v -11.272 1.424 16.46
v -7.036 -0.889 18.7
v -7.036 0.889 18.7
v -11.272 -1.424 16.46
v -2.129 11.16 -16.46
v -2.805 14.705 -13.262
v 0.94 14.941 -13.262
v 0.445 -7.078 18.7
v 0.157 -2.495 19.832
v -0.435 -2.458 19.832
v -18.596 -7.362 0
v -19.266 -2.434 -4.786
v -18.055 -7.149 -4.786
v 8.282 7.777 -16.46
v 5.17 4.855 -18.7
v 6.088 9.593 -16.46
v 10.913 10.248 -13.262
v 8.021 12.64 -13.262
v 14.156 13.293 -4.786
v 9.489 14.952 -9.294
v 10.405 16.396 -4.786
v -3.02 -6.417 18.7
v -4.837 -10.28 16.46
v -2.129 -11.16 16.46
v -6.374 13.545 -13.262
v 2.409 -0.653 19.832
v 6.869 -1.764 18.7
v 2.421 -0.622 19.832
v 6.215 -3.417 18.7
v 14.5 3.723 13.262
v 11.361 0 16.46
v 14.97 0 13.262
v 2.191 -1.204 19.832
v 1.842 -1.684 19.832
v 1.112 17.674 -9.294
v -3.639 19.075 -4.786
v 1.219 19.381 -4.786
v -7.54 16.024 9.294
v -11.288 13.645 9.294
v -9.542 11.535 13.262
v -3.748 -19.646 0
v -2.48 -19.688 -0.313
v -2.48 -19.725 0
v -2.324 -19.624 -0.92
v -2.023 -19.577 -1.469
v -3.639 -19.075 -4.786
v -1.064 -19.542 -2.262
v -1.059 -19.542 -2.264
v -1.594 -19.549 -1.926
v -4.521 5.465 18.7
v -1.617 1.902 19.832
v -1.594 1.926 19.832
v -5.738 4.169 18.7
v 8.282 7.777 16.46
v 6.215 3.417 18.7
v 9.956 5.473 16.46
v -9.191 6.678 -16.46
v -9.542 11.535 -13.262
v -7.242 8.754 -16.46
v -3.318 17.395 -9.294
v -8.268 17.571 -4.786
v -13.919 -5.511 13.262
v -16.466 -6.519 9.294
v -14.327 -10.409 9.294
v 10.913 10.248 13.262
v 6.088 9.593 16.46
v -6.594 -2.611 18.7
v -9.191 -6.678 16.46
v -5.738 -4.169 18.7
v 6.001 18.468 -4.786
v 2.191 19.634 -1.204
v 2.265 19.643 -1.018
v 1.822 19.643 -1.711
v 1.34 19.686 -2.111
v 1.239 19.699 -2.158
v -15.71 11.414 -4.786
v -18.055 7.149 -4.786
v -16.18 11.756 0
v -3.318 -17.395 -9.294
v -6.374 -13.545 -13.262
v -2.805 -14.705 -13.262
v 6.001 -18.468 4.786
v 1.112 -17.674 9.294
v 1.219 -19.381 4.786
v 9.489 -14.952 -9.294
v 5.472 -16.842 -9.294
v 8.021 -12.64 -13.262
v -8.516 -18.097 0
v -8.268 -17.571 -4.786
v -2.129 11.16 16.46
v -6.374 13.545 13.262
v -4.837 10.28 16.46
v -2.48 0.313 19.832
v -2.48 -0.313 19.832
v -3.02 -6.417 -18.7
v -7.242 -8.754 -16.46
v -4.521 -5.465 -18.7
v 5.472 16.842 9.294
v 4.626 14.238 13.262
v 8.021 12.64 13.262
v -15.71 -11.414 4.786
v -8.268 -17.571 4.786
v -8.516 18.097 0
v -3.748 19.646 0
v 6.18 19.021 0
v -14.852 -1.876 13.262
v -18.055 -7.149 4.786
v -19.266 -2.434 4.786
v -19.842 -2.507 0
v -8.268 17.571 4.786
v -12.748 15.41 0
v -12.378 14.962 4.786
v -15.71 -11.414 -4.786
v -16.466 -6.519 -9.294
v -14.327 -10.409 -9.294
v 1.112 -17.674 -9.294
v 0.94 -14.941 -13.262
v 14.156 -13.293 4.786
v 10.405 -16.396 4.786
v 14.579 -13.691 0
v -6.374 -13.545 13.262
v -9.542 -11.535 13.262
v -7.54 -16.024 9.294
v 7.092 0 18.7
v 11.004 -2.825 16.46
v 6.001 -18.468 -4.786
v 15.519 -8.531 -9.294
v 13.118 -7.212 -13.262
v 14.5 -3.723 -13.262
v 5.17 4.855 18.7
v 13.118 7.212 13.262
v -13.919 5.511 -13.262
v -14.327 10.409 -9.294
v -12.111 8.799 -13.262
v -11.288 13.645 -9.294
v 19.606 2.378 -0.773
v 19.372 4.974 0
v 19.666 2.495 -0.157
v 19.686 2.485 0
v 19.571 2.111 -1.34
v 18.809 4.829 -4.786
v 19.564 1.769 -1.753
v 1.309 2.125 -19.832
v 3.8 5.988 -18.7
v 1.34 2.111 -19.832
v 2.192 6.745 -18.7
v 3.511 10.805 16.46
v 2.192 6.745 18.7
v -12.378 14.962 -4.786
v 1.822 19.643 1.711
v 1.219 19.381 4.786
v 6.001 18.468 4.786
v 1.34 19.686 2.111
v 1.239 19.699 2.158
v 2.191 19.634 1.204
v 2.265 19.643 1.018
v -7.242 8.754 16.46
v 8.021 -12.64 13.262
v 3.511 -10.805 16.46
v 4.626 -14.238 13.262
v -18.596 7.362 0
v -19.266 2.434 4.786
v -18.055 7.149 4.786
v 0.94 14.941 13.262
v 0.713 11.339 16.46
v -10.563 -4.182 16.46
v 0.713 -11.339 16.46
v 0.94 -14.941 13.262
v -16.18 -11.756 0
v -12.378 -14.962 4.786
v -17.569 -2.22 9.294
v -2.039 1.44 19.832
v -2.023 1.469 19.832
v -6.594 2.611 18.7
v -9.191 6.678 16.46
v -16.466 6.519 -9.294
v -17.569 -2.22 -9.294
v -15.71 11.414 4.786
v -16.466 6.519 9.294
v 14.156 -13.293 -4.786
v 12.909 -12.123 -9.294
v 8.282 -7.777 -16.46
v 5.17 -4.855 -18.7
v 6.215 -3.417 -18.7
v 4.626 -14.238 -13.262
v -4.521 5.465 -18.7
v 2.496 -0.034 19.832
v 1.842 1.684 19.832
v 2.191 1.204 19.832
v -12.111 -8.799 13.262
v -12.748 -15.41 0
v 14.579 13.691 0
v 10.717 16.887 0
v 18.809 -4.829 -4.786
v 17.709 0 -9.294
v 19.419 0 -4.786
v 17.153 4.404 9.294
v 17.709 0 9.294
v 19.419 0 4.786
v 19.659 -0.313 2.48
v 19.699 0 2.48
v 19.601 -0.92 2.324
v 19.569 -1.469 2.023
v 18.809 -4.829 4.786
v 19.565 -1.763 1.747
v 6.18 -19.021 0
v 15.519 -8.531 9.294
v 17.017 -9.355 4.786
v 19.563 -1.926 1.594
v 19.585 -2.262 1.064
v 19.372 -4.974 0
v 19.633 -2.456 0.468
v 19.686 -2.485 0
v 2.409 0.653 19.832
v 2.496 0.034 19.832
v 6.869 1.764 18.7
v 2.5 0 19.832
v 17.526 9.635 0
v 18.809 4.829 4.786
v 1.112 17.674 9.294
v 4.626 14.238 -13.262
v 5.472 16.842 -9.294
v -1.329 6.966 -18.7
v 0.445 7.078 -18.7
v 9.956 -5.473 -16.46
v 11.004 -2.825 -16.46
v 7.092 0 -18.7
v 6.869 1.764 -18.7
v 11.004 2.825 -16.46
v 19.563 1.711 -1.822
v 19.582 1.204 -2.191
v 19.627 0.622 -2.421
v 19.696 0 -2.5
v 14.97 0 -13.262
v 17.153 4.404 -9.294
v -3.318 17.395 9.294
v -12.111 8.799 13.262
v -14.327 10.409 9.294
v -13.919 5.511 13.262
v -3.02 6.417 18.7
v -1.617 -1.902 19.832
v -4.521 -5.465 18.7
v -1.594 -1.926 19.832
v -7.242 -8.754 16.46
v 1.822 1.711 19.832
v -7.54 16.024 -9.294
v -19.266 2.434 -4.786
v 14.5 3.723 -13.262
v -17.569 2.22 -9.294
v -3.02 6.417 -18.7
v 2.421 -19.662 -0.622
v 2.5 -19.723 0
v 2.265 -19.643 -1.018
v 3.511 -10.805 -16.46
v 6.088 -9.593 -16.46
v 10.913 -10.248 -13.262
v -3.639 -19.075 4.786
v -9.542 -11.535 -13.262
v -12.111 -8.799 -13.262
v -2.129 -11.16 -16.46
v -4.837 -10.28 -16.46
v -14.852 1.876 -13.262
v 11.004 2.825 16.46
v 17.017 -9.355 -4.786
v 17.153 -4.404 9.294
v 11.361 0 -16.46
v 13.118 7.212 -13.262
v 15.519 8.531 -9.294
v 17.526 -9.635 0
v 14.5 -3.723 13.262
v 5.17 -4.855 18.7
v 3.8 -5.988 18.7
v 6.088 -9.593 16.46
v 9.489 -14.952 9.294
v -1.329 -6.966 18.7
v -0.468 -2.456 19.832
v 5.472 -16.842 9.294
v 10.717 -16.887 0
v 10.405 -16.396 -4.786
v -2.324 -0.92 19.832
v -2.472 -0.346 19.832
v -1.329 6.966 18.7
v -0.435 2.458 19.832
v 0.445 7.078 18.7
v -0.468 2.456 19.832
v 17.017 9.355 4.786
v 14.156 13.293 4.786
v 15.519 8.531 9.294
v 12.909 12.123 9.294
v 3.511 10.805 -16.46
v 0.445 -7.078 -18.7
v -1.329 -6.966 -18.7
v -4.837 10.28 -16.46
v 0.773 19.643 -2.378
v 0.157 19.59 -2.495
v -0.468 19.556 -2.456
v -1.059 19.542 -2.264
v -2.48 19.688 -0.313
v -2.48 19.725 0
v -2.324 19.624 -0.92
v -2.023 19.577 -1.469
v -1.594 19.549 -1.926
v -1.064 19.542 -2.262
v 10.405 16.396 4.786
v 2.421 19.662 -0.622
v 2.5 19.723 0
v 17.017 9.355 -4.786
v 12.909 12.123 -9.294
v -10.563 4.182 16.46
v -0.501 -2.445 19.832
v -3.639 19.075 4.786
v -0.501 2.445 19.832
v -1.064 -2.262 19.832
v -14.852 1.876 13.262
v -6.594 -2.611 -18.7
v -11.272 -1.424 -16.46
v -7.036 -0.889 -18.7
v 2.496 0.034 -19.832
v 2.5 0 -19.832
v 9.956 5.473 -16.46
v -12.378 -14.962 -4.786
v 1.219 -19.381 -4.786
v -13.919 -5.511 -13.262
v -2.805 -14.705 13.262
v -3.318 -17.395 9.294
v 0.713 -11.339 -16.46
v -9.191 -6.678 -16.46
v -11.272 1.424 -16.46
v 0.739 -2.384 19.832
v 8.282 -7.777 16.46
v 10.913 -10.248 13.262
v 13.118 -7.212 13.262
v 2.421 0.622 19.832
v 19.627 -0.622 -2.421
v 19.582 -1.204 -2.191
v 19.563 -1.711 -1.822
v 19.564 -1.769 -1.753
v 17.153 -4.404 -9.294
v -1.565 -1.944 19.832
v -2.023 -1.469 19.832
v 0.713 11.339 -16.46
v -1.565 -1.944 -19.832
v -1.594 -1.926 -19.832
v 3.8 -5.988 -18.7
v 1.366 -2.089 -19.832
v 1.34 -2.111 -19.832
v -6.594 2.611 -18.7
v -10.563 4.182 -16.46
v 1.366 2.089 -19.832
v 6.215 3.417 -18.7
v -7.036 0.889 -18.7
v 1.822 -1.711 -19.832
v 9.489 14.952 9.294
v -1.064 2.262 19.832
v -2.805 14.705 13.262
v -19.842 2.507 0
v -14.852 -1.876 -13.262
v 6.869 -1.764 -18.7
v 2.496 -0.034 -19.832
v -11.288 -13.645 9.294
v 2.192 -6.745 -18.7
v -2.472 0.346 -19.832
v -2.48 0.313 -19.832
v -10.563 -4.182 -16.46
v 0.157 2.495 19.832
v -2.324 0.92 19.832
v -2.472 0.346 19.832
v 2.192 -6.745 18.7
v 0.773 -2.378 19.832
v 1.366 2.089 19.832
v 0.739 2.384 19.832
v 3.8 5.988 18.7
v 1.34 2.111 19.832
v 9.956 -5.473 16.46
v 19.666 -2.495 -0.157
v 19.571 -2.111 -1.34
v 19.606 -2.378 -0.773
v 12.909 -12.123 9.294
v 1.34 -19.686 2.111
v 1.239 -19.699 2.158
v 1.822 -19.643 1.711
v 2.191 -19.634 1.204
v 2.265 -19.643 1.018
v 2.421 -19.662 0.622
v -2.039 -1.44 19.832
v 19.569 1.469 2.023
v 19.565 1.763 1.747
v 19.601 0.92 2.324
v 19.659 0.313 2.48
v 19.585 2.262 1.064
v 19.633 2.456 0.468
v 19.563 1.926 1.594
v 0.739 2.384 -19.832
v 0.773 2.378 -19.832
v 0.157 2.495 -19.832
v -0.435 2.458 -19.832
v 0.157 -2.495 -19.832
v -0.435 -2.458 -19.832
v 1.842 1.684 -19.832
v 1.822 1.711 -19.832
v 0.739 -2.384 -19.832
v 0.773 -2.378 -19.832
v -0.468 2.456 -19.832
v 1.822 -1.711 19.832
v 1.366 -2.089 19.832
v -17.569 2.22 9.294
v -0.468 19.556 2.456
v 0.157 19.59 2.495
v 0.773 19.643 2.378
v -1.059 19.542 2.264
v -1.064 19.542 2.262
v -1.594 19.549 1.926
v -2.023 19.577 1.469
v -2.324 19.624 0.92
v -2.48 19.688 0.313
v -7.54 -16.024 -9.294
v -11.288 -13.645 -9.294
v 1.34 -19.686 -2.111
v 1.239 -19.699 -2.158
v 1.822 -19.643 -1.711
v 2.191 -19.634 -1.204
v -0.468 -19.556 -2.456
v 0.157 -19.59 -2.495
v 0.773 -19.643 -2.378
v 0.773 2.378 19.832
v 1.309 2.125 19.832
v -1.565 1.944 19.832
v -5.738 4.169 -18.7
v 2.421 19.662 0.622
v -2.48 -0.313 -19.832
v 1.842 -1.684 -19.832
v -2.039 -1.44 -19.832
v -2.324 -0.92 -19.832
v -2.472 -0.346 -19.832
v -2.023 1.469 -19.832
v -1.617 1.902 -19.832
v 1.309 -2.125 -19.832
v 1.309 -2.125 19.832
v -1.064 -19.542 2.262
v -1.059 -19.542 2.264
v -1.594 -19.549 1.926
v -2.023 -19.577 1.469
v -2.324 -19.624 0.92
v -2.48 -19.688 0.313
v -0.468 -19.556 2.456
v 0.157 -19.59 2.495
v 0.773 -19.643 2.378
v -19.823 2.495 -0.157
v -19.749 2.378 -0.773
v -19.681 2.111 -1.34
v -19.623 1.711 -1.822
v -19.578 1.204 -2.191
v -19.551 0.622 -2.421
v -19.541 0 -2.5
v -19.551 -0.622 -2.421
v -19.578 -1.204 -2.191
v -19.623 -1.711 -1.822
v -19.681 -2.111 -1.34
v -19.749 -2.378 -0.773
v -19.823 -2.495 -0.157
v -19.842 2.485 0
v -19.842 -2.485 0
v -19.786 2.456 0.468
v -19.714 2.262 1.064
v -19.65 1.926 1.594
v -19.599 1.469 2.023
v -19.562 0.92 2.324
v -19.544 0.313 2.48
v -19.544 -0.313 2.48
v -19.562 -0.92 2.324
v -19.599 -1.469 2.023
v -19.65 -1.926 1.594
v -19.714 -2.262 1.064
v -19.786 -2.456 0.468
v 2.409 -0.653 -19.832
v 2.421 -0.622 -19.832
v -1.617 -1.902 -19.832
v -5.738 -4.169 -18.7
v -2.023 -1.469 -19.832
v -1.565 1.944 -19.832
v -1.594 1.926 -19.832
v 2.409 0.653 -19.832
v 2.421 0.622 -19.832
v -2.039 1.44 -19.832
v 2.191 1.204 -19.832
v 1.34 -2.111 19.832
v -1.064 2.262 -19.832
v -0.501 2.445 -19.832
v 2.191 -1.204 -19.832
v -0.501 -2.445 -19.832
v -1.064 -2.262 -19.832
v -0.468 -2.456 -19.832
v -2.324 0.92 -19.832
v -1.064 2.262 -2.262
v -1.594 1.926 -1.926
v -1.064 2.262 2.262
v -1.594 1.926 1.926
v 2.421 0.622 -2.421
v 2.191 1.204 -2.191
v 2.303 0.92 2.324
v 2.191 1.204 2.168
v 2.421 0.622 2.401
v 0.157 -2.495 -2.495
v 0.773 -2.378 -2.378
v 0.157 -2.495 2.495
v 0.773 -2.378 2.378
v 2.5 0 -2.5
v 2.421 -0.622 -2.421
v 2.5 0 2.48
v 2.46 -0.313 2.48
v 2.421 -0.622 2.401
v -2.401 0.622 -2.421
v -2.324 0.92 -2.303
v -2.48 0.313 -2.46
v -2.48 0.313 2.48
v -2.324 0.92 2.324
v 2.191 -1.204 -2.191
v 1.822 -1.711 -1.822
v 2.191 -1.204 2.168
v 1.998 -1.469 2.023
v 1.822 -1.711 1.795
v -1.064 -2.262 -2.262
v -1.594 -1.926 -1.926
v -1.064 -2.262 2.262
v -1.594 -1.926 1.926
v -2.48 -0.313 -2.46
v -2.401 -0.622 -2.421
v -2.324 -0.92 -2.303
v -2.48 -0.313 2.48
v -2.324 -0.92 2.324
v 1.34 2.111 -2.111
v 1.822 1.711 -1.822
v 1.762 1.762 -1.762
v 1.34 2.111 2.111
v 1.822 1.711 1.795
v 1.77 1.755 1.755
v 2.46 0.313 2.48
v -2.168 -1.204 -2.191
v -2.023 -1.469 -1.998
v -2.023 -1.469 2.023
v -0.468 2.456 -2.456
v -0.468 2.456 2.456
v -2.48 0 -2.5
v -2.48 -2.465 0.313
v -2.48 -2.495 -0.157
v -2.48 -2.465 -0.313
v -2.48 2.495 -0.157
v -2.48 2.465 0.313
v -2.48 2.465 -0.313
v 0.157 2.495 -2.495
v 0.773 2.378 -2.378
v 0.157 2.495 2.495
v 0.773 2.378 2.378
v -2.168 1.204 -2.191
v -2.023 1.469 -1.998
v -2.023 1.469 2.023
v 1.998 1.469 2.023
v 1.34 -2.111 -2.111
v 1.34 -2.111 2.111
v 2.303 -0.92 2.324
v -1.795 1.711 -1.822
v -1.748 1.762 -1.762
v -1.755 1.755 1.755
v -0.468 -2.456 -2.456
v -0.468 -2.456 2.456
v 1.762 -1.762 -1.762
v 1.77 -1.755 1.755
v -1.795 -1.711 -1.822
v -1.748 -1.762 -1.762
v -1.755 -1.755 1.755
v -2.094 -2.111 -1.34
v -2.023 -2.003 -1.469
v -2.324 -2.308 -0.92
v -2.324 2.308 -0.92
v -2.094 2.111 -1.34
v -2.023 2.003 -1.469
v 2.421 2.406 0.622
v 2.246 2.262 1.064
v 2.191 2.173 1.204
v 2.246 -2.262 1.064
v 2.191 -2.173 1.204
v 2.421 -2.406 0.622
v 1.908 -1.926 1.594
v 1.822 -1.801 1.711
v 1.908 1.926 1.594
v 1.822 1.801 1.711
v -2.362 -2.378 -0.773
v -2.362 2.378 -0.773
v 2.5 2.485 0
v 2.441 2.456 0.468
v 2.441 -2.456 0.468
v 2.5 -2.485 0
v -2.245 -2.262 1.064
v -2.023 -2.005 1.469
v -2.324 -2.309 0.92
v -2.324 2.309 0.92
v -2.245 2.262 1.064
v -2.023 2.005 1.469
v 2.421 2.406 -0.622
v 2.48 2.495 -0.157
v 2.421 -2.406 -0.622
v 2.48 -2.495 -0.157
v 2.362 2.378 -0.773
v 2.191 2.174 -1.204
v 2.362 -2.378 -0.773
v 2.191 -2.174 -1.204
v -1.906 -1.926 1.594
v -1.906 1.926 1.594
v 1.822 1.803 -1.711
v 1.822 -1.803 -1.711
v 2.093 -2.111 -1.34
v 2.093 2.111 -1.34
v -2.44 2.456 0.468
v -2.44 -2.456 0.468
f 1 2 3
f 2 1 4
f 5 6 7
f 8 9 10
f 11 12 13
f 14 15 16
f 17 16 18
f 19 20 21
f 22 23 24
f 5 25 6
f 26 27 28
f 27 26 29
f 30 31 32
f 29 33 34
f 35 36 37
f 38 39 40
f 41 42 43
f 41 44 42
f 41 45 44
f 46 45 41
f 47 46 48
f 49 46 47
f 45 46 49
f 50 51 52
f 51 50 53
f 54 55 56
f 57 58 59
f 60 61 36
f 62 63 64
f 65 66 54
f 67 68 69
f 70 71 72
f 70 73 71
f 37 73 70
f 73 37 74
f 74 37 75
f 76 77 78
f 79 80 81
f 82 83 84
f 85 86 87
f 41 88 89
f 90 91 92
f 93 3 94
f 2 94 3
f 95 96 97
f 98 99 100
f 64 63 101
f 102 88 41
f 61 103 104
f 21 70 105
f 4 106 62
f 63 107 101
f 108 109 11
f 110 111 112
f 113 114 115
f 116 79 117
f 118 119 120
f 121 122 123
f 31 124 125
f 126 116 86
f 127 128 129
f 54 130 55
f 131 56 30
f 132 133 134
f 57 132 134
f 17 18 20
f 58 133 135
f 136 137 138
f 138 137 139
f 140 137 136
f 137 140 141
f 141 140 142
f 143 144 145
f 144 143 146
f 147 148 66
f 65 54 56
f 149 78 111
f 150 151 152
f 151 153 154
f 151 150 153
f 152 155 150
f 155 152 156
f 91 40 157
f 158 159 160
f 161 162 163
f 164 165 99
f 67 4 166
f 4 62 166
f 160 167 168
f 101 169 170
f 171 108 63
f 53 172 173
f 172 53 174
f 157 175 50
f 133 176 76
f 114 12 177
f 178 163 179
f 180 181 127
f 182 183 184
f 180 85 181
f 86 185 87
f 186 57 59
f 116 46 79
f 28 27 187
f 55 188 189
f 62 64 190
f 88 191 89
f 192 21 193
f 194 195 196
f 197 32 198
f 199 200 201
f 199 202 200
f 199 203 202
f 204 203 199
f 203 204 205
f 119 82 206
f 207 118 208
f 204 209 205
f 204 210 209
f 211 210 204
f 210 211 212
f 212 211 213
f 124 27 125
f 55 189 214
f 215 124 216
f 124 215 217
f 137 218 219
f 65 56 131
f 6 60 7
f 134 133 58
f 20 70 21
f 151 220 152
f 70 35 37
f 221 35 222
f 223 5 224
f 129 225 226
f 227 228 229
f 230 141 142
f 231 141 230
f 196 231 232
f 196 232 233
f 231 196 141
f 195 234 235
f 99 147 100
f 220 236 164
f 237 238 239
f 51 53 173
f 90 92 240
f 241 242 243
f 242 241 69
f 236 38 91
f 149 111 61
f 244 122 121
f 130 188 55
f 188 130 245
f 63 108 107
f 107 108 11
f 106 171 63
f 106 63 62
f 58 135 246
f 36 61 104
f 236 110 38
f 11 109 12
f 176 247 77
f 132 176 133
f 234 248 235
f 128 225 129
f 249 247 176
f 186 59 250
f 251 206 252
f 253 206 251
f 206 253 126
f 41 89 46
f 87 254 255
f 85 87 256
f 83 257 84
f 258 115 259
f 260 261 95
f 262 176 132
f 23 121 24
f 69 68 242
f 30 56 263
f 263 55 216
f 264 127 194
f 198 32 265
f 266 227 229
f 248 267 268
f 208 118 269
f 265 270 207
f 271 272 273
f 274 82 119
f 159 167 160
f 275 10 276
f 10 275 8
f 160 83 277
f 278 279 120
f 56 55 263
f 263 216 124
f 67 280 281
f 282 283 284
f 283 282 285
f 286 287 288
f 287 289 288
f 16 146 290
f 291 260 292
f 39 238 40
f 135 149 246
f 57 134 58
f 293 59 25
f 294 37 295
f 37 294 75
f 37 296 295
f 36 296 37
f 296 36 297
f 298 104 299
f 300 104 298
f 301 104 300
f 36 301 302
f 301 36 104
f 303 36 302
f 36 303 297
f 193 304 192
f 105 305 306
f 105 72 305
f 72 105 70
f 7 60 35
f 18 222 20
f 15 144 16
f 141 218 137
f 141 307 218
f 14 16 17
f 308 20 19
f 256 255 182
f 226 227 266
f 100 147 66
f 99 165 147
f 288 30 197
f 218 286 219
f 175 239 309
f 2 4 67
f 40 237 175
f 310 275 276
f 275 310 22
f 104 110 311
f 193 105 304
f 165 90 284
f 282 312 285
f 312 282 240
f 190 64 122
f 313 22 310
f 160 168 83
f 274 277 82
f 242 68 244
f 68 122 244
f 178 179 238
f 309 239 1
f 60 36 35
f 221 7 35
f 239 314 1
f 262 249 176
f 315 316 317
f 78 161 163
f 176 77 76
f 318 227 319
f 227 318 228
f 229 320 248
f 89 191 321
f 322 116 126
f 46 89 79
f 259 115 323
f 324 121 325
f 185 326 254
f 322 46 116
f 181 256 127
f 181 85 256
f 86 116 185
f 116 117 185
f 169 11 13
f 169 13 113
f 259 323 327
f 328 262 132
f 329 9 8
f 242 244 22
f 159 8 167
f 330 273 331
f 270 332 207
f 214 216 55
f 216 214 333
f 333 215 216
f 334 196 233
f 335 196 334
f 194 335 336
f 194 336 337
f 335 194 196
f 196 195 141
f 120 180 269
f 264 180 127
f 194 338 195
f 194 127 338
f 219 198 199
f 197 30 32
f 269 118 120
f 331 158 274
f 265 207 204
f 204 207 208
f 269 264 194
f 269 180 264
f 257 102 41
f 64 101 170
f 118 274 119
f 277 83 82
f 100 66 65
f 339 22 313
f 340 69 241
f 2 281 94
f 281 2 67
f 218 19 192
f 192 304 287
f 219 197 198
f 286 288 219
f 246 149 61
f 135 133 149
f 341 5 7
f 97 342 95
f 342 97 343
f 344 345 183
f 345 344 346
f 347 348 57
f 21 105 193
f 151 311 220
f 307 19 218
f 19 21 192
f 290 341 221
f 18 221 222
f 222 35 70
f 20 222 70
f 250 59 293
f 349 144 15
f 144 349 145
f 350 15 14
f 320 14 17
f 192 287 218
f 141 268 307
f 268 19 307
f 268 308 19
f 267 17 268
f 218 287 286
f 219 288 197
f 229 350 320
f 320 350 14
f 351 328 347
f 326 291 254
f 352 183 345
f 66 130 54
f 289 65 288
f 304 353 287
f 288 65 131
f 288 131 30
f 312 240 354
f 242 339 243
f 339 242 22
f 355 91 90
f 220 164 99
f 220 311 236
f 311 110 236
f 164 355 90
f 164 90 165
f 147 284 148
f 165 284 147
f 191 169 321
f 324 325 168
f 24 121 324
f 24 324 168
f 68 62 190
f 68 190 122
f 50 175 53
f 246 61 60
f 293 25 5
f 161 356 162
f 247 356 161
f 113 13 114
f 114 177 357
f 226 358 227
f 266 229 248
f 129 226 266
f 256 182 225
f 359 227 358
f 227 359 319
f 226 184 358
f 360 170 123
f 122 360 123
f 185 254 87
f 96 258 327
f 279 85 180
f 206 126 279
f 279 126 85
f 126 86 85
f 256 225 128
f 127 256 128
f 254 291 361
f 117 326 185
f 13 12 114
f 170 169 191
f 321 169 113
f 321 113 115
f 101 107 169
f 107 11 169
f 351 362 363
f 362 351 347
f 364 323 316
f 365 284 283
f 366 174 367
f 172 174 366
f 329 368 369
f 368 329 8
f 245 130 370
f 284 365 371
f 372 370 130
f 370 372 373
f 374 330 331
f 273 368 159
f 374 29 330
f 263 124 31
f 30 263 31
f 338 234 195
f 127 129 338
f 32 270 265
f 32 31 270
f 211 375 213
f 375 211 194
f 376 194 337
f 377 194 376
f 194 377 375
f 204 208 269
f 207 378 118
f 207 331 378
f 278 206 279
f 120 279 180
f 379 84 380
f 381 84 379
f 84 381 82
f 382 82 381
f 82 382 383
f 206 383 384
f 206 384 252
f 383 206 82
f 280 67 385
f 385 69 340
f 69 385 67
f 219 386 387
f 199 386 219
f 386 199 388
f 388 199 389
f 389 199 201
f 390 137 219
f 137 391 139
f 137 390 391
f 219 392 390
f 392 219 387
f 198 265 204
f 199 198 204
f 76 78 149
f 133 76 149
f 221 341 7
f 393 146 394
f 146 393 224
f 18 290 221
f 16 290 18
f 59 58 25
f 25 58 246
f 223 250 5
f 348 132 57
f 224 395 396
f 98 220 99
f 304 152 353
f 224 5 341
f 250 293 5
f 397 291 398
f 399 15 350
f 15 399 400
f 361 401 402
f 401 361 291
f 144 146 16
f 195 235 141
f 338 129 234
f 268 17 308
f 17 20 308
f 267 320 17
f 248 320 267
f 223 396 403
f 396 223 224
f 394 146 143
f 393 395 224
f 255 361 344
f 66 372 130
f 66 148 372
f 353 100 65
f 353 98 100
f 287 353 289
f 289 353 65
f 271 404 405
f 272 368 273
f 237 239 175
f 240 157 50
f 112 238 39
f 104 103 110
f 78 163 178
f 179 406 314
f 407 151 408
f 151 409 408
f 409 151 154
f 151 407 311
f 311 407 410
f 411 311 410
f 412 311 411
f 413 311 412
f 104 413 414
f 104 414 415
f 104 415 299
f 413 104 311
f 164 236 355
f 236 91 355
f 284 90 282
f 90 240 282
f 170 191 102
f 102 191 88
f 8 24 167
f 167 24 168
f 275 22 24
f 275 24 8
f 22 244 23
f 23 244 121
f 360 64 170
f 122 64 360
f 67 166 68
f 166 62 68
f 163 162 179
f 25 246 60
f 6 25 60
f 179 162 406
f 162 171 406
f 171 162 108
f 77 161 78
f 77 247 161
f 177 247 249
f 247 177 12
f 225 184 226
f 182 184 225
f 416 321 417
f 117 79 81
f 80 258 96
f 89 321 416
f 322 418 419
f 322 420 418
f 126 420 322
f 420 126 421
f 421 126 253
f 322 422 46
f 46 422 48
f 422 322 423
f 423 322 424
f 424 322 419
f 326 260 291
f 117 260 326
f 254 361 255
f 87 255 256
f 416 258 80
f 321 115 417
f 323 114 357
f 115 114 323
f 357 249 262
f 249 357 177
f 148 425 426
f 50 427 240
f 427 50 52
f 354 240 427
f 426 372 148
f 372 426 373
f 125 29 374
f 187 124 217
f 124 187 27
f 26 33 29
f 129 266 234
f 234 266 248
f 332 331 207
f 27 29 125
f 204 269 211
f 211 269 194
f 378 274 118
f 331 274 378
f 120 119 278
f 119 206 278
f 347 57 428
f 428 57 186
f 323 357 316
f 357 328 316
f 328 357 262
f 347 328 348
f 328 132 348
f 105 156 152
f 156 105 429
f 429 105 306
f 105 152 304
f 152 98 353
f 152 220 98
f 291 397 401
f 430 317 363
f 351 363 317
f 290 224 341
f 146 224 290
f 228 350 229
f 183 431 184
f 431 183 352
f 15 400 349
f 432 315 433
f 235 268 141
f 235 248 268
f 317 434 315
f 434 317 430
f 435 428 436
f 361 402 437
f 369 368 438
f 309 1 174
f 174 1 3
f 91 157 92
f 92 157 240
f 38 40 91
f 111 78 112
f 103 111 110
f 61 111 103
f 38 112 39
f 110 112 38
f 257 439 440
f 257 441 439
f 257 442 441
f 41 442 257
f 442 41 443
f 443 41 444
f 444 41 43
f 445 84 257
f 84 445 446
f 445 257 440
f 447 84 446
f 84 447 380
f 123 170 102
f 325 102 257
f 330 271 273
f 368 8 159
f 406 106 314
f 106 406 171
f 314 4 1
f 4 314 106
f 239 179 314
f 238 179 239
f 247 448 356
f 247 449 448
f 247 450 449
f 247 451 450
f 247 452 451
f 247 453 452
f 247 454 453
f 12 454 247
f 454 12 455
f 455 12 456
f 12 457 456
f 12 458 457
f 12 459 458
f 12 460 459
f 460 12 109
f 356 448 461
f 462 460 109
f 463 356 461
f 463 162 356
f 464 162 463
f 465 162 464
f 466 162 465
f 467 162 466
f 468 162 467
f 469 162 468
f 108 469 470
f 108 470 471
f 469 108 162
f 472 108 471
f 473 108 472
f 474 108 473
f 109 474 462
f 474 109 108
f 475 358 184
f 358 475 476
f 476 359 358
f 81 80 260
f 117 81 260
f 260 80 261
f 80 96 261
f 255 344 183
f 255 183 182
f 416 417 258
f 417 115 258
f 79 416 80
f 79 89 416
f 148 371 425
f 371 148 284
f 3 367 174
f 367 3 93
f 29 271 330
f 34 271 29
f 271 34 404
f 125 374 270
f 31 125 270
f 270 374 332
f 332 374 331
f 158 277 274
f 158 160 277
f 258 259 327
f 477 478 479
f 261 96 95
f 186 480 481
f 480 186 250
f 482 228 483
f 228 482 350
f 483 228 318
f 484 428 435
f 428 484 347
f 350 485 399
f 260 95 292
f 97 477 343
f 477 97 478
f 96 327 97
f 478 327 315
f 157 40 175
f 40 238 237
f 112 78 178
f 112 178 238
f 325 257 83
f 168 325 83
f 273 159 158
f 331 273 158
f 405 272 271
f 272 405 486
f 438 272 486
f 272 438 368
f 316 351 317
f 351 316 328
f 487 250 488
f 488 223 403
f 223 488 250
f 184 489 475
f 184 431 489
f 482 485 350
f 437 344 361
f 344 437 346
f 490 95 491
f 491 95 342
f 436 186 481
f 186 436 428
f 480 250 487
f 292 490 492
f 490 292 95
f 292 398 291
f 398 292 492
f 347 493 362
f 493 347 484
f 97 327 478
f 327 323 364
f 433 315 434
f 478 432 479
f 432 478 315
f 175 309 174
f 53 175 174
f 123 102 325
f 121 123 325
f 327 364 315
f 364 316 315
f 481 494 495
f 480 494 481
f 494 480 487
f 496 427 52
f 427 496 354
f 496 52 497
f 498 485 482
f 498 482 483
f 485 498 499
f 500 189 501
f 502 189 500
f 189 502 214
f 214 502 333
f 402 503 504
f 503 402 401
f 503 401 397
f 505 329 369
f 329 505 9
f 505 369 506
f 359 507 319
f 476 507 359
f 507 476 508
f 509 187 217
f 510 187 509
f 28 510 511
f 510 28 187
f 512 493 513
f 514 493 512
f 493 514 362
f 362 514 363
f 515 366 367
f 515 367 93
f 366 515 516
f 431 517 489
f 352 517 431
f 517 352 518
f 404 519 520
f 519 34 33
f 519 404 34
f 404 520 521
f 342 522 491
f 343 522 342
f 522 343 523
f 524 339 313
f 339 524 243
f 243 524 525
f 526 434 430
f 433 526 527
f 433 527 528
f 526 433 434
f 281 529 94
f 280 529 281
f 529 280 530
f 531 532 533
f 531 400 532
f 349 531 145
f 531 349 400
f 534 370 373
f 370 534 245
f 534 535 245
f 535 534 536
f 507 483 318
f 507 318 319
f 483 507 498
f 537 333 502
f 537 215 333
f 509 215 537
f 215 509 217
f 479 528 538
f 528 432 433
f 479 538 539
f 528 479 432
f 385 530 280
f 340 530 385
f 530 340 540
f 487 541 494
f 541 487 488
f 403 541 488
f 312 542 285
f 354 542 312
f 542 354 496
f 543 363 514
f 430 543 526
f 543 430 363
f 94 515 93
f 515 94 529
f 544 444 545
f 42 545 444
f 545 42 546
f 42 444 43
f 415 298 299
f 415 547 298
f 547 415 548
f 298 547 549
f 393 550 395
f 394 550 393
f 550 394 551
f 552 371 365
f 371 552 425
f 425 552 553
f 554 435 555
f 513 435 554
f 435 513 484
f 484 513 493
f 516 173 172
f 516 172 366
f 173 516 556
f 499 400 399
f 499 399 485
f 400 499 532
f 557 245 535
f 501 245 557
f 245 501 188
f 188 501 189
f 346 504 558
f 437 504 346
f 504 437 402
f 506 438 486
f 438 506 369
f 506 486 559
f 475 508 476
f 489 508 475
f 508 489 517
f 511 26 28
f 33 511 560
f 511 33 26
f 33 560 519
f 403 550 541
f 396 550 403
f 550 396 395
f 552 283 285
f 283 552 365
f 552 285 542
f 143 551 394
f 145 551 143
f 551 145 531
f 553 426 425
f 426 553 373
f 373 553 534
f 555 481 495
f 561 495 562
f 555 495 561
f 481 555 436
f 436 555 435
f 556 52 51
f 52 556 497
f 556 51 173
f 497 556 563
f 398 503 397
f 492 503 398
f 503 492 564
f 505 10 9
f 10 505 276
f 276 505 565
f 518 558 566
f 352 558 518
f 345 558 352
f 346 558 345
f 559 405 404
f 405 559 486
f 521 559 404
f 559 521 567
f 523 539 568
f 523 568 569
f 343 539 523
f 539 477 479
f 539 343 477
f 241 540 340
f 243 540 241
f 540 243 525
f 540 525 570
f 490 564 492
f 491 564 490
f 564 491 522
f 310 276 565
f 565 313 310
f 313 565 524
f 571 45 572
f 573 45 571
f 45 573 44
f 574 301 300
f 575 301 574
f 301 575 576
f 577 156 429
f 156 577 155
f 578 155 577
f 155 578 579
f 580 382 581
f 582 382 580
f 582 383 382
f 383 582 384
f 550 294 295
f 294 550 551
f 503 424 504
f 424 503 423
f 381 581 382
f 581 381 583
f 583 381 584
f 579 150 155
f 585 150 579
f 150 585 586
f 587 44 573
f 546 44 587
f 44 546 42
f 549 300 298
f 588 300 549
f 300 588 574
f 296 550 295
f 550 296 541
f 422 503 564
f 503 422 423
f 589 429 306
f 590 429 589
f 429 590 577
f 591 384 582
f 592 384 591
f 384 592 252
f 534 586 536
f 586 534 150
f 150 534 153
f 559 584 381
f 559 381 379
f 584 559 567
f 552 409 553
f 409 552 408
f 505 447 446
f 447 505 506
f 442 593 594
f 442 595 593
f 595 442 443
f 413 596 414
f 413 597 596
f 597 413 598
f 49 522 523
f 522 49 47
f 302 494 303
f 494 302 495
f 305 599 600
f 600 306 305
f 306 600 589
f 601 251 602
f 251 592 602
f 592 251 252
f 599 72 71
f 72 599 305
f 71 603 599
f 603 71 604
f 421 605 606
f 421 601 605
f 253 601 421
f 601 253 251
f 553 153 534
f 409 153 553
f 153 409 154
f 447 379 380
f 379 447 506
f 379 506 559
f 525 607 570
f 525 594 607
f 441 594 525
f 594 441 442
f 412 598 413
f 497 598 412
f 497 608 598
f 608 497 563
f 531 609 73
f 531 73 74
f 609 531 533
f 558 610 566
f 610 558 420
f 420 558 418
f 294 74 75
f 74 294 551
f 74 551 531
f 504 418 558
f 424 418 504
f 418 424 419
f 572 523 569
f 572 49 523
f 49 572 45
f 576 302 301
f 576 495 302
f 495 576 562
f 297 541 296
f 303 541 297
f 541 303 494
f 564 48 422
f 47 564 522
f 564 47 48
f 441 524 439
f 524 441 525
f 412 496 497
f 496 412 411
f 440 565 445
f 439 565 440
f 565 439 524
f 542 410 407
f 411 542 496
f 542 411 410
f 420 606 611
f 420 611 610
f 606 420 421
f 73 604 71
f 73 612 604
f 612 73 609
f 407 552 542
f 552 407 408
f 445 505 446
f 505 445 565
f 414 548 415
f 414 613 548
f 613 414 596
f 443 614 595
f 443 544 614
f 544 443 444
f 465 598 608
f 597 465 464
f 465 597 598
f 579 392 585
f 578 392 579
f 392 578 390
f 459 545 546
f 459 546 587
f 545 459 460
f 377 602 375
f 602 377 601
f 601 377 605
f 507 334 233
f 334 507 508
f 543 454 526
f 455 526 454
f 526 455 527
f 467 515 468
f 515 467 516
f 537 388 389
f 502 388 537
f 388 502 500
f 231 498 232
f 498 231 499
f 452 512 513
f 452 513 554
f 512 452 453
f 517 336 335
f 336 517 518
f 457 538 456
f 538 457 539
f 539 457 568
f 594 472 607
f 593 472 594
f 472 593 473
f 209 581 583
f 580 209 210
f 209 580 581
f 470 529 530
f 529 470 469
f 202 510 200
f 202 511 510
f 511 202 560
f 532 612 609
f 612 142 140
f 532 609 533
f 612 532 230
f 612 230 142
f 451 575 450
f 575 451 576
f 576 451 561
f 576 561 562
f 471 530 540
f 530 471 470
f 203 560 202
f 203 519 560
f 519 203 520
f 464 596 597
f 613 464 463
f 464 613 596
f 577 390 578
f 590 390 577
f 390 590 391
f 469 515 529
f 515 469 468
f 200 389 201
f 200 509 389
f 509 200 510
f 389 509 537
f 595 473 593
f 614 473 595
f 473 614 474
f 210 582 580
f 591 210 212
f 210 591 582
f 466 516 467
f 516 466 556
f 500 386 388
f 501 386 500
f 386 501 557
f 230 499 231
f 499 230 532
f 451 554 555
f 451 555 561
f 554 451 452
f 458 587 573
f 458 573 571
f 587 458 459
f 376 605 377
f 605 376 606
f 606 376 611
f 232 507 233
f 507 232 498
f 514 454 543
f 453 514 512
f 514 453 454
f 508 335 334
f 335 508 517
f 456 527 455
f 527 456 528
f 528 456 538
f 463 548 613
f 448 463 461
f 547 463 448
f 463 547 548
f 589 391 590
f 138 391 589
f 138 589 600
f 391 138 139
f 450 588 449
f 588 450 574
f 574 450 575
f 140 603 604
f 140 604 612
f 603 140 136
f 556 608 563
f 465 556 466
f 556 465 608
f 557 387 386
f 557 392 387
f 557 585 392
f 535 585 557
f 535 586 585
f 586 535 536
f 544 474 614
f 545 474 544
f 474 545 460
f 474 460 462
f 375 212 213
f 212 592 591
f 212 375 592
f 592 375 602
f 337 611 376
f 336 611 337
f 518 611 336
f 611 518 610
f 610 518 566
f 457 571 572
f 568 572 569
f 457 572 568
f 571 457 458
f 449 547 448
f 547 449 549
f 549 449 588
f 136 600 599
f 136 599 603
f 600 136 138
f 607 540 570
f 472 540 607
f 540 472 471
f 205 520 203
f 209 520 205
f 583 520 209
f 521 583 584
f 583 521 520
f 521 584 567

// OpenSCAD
$fn=25;
cylw = 5;
cylh = 50;
difference(){   
   sphere(20);
   translate([0,0,-25])
   cylinder(d=cylw,h=cylh);
   translate([0,25,0])
   rotate([90,0,0])
   cylinder(d=cylw,h=cylh);
   translate([-25,0,0])
   rotate([0,90,0])
   cylinder(d=cylw,h=cylh);
}
    
